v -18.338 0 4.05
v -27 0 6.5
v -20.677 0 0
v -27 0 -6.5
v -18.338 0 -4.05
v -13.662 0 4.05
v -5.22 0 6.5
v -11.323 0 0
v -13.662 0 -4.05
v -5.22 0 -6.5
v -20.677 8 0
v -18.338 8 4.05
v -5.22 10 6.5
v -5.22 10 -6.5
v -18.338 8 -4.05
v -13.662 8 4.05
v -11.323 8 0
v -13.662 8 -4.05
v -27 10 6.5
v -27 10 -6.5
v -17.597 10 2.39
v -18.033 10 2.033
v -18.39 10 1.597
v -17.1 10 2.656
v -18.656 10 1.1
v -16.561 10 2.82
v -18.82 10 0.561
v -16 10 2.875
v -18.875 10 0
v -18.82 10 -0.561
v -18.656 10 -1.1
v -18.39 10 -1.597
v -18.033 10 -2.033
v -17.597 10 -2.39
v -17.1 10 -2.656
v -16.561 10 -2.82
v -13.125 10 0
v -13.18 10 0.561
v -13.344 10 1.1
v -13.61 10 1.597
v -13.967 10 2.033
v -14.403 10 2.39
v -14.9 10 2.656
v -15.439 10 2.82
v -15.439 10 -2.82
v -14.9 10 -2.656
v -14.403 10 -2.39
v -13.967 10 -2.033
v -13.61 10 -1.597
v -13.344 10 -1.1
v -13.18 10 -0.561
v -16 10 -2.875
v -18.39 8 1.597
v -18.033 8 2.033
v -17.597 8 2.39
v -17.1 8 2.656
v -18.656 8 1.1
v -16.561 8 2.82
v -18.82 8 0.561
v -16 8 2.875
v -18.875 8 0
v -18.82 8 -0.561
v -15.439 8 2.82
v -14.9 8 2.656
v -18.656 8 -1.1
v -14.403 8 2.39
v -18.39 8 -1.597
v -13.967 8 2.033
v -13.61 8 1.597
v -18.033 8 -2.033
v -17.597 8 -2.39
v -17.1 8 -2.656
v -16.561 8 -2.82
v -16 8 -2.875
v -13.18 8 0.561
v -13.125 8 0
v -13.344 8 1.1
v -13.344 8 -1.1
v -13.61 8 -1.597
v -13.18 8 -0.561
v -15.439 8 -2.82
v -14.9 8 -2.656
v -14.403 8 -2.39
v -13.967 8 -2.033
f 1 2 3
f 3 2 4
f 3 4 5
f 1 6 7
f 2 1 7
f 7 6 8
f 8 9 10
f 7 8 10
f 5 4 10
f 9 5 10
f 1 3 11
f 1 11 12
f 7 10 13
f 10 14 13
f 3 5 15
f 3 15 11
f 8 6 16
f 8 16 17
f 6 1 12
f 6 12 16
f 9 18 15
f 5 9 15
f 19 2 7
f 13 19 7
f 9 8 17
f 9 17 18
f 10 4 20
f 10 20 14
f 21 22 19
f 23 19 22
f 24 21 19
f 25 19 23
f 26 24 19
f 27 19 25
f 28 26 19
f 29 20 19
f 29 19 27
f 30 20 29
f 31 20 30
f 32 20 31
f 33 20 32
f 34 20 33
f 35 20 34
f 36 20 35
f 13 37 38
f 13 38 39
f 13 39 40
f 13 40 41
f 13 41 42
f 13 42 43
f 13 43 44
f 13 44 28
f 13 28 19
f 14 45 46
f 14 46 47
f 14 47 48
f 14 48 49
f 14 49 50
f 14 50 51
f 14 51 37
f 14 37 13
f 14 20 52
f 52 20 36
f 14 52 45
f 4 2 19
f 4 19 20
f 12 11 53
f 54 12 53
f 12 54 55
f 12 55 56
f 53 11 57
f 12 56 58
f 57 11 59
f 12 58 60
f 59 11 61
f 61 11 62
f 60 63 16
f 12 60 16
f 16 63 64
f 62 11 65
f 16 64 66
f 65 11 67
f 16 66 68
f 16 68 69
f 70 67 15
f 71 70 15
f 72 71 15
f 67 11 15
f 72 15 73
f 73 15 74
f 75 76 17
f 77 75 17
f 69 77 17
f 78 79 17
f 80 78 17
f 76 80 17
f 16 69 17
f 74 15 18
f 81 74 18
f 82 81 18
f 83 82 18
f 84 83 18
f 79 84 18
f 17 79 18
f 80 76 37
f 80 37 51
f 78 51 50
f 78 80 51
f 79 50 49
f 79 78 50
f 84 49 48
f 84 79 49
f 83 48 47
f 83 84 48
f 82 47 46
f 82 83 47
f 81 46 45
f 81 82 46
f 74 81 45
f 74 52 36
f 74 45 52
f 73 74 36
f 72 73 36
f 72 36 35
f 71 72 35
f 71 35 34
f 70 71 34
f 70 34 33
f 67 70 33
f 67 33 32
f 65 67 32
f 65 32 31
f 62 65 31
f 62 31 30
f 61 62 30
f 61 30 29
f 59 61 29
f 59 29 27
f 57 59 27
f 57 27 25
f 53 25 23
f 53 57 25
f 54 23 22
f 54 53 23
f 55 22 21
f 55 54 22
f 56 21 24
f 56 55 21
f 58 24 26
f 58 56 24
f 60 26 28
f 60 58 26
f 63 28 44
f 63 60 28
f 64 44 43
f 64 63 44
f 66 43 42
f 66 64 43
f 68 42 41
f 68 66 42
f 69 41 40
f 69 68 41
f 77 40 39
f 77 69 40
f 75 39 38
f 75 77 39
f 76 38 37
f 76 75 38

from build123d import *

# Parameters (mm, degrees)
CROQUIS1_W              = 54
CROQUIS1_H              = 13
SALIENTE_EXTRUIR1_DEPTH = 10
CORTAR_EXTRUIR1_DEPTH   = 8
CROQUIS1_4_R            = 2.875
CORTAR_EXTRUIR2_DEPTH   = 11
CROQUIS2_W              = 50.887178886
CROQUIS2_H              = 27.662521268
CORTAR_EXTRUIR3_DEPTH   = 33.22


with BuildPart() as part:
    # Croquis1 → Saliente-Extruir1 (new body)
    with BuildSketch(Plane(origin=(0, 0, 0), x_dir=(1, 0, 0), z_dir=(0, 1, 0))):
        Rectangle(CROQUIS1_W, CROQUIS1_H)
    extrude(amount=SALIENTE_EXTRUIR1_DEPTH)

    # Croquis1<3> → Cortar-Extruir1 (cut)
    with BuildSketch(Plane(origin=(0, 0, 0), x_dir=(1, 0, 0), z_dir=(0, 1, 0))):
        Polygon((-18.33826859, -4.05), (-13.66173141, -4.05), (-11.32346282, 0), (-13.66173141, 4.05), (-18.33826859, 4.05), (-20.67653718, 0), align=None)
        Polygon((20.67653718, 0), (18.33826859, 4.05), (13.66173141, 4.05), (11.32346282, 0), (13.66173141, -4.05), (18.33826859, -4.05), align=None)
    extrude(amount=CORTAR_EXTRUIR1_DEPTH, mode=Mode.SUBTRACT)

    # Croquis1<4> → Cortar-Extruir2 (cut, through all)
    with BuildSketch(Plane(origin=(0, 0, 0), x_dir=(1, 0, 0), z_dir=(0, 1, 0))):
        with Locations((-16, 0)):
            Circle(CROQUIS1_4_R)
        with Locations((16, 0)):
            Circle(CROQUIS1_4_R)
    extrude(amount=CORTAR_EXTRUIR2_DEPTH, mode=Mode.SUBTRACT)

    # Croquis2 → Cortar-Extruir3 (cut, through all)
    with BuildSketch(Plane.ZY.offset(5.22)):
        with Locations((0.866942471, 5.460502056)):
            Rectangle(CROQUIS2_W, CROQUIS2_H)
    extrude(amount=-CORTAR_EXTRUIR3_DEPTH, mode=Mode.SUBTRACT)


solid = part.part
